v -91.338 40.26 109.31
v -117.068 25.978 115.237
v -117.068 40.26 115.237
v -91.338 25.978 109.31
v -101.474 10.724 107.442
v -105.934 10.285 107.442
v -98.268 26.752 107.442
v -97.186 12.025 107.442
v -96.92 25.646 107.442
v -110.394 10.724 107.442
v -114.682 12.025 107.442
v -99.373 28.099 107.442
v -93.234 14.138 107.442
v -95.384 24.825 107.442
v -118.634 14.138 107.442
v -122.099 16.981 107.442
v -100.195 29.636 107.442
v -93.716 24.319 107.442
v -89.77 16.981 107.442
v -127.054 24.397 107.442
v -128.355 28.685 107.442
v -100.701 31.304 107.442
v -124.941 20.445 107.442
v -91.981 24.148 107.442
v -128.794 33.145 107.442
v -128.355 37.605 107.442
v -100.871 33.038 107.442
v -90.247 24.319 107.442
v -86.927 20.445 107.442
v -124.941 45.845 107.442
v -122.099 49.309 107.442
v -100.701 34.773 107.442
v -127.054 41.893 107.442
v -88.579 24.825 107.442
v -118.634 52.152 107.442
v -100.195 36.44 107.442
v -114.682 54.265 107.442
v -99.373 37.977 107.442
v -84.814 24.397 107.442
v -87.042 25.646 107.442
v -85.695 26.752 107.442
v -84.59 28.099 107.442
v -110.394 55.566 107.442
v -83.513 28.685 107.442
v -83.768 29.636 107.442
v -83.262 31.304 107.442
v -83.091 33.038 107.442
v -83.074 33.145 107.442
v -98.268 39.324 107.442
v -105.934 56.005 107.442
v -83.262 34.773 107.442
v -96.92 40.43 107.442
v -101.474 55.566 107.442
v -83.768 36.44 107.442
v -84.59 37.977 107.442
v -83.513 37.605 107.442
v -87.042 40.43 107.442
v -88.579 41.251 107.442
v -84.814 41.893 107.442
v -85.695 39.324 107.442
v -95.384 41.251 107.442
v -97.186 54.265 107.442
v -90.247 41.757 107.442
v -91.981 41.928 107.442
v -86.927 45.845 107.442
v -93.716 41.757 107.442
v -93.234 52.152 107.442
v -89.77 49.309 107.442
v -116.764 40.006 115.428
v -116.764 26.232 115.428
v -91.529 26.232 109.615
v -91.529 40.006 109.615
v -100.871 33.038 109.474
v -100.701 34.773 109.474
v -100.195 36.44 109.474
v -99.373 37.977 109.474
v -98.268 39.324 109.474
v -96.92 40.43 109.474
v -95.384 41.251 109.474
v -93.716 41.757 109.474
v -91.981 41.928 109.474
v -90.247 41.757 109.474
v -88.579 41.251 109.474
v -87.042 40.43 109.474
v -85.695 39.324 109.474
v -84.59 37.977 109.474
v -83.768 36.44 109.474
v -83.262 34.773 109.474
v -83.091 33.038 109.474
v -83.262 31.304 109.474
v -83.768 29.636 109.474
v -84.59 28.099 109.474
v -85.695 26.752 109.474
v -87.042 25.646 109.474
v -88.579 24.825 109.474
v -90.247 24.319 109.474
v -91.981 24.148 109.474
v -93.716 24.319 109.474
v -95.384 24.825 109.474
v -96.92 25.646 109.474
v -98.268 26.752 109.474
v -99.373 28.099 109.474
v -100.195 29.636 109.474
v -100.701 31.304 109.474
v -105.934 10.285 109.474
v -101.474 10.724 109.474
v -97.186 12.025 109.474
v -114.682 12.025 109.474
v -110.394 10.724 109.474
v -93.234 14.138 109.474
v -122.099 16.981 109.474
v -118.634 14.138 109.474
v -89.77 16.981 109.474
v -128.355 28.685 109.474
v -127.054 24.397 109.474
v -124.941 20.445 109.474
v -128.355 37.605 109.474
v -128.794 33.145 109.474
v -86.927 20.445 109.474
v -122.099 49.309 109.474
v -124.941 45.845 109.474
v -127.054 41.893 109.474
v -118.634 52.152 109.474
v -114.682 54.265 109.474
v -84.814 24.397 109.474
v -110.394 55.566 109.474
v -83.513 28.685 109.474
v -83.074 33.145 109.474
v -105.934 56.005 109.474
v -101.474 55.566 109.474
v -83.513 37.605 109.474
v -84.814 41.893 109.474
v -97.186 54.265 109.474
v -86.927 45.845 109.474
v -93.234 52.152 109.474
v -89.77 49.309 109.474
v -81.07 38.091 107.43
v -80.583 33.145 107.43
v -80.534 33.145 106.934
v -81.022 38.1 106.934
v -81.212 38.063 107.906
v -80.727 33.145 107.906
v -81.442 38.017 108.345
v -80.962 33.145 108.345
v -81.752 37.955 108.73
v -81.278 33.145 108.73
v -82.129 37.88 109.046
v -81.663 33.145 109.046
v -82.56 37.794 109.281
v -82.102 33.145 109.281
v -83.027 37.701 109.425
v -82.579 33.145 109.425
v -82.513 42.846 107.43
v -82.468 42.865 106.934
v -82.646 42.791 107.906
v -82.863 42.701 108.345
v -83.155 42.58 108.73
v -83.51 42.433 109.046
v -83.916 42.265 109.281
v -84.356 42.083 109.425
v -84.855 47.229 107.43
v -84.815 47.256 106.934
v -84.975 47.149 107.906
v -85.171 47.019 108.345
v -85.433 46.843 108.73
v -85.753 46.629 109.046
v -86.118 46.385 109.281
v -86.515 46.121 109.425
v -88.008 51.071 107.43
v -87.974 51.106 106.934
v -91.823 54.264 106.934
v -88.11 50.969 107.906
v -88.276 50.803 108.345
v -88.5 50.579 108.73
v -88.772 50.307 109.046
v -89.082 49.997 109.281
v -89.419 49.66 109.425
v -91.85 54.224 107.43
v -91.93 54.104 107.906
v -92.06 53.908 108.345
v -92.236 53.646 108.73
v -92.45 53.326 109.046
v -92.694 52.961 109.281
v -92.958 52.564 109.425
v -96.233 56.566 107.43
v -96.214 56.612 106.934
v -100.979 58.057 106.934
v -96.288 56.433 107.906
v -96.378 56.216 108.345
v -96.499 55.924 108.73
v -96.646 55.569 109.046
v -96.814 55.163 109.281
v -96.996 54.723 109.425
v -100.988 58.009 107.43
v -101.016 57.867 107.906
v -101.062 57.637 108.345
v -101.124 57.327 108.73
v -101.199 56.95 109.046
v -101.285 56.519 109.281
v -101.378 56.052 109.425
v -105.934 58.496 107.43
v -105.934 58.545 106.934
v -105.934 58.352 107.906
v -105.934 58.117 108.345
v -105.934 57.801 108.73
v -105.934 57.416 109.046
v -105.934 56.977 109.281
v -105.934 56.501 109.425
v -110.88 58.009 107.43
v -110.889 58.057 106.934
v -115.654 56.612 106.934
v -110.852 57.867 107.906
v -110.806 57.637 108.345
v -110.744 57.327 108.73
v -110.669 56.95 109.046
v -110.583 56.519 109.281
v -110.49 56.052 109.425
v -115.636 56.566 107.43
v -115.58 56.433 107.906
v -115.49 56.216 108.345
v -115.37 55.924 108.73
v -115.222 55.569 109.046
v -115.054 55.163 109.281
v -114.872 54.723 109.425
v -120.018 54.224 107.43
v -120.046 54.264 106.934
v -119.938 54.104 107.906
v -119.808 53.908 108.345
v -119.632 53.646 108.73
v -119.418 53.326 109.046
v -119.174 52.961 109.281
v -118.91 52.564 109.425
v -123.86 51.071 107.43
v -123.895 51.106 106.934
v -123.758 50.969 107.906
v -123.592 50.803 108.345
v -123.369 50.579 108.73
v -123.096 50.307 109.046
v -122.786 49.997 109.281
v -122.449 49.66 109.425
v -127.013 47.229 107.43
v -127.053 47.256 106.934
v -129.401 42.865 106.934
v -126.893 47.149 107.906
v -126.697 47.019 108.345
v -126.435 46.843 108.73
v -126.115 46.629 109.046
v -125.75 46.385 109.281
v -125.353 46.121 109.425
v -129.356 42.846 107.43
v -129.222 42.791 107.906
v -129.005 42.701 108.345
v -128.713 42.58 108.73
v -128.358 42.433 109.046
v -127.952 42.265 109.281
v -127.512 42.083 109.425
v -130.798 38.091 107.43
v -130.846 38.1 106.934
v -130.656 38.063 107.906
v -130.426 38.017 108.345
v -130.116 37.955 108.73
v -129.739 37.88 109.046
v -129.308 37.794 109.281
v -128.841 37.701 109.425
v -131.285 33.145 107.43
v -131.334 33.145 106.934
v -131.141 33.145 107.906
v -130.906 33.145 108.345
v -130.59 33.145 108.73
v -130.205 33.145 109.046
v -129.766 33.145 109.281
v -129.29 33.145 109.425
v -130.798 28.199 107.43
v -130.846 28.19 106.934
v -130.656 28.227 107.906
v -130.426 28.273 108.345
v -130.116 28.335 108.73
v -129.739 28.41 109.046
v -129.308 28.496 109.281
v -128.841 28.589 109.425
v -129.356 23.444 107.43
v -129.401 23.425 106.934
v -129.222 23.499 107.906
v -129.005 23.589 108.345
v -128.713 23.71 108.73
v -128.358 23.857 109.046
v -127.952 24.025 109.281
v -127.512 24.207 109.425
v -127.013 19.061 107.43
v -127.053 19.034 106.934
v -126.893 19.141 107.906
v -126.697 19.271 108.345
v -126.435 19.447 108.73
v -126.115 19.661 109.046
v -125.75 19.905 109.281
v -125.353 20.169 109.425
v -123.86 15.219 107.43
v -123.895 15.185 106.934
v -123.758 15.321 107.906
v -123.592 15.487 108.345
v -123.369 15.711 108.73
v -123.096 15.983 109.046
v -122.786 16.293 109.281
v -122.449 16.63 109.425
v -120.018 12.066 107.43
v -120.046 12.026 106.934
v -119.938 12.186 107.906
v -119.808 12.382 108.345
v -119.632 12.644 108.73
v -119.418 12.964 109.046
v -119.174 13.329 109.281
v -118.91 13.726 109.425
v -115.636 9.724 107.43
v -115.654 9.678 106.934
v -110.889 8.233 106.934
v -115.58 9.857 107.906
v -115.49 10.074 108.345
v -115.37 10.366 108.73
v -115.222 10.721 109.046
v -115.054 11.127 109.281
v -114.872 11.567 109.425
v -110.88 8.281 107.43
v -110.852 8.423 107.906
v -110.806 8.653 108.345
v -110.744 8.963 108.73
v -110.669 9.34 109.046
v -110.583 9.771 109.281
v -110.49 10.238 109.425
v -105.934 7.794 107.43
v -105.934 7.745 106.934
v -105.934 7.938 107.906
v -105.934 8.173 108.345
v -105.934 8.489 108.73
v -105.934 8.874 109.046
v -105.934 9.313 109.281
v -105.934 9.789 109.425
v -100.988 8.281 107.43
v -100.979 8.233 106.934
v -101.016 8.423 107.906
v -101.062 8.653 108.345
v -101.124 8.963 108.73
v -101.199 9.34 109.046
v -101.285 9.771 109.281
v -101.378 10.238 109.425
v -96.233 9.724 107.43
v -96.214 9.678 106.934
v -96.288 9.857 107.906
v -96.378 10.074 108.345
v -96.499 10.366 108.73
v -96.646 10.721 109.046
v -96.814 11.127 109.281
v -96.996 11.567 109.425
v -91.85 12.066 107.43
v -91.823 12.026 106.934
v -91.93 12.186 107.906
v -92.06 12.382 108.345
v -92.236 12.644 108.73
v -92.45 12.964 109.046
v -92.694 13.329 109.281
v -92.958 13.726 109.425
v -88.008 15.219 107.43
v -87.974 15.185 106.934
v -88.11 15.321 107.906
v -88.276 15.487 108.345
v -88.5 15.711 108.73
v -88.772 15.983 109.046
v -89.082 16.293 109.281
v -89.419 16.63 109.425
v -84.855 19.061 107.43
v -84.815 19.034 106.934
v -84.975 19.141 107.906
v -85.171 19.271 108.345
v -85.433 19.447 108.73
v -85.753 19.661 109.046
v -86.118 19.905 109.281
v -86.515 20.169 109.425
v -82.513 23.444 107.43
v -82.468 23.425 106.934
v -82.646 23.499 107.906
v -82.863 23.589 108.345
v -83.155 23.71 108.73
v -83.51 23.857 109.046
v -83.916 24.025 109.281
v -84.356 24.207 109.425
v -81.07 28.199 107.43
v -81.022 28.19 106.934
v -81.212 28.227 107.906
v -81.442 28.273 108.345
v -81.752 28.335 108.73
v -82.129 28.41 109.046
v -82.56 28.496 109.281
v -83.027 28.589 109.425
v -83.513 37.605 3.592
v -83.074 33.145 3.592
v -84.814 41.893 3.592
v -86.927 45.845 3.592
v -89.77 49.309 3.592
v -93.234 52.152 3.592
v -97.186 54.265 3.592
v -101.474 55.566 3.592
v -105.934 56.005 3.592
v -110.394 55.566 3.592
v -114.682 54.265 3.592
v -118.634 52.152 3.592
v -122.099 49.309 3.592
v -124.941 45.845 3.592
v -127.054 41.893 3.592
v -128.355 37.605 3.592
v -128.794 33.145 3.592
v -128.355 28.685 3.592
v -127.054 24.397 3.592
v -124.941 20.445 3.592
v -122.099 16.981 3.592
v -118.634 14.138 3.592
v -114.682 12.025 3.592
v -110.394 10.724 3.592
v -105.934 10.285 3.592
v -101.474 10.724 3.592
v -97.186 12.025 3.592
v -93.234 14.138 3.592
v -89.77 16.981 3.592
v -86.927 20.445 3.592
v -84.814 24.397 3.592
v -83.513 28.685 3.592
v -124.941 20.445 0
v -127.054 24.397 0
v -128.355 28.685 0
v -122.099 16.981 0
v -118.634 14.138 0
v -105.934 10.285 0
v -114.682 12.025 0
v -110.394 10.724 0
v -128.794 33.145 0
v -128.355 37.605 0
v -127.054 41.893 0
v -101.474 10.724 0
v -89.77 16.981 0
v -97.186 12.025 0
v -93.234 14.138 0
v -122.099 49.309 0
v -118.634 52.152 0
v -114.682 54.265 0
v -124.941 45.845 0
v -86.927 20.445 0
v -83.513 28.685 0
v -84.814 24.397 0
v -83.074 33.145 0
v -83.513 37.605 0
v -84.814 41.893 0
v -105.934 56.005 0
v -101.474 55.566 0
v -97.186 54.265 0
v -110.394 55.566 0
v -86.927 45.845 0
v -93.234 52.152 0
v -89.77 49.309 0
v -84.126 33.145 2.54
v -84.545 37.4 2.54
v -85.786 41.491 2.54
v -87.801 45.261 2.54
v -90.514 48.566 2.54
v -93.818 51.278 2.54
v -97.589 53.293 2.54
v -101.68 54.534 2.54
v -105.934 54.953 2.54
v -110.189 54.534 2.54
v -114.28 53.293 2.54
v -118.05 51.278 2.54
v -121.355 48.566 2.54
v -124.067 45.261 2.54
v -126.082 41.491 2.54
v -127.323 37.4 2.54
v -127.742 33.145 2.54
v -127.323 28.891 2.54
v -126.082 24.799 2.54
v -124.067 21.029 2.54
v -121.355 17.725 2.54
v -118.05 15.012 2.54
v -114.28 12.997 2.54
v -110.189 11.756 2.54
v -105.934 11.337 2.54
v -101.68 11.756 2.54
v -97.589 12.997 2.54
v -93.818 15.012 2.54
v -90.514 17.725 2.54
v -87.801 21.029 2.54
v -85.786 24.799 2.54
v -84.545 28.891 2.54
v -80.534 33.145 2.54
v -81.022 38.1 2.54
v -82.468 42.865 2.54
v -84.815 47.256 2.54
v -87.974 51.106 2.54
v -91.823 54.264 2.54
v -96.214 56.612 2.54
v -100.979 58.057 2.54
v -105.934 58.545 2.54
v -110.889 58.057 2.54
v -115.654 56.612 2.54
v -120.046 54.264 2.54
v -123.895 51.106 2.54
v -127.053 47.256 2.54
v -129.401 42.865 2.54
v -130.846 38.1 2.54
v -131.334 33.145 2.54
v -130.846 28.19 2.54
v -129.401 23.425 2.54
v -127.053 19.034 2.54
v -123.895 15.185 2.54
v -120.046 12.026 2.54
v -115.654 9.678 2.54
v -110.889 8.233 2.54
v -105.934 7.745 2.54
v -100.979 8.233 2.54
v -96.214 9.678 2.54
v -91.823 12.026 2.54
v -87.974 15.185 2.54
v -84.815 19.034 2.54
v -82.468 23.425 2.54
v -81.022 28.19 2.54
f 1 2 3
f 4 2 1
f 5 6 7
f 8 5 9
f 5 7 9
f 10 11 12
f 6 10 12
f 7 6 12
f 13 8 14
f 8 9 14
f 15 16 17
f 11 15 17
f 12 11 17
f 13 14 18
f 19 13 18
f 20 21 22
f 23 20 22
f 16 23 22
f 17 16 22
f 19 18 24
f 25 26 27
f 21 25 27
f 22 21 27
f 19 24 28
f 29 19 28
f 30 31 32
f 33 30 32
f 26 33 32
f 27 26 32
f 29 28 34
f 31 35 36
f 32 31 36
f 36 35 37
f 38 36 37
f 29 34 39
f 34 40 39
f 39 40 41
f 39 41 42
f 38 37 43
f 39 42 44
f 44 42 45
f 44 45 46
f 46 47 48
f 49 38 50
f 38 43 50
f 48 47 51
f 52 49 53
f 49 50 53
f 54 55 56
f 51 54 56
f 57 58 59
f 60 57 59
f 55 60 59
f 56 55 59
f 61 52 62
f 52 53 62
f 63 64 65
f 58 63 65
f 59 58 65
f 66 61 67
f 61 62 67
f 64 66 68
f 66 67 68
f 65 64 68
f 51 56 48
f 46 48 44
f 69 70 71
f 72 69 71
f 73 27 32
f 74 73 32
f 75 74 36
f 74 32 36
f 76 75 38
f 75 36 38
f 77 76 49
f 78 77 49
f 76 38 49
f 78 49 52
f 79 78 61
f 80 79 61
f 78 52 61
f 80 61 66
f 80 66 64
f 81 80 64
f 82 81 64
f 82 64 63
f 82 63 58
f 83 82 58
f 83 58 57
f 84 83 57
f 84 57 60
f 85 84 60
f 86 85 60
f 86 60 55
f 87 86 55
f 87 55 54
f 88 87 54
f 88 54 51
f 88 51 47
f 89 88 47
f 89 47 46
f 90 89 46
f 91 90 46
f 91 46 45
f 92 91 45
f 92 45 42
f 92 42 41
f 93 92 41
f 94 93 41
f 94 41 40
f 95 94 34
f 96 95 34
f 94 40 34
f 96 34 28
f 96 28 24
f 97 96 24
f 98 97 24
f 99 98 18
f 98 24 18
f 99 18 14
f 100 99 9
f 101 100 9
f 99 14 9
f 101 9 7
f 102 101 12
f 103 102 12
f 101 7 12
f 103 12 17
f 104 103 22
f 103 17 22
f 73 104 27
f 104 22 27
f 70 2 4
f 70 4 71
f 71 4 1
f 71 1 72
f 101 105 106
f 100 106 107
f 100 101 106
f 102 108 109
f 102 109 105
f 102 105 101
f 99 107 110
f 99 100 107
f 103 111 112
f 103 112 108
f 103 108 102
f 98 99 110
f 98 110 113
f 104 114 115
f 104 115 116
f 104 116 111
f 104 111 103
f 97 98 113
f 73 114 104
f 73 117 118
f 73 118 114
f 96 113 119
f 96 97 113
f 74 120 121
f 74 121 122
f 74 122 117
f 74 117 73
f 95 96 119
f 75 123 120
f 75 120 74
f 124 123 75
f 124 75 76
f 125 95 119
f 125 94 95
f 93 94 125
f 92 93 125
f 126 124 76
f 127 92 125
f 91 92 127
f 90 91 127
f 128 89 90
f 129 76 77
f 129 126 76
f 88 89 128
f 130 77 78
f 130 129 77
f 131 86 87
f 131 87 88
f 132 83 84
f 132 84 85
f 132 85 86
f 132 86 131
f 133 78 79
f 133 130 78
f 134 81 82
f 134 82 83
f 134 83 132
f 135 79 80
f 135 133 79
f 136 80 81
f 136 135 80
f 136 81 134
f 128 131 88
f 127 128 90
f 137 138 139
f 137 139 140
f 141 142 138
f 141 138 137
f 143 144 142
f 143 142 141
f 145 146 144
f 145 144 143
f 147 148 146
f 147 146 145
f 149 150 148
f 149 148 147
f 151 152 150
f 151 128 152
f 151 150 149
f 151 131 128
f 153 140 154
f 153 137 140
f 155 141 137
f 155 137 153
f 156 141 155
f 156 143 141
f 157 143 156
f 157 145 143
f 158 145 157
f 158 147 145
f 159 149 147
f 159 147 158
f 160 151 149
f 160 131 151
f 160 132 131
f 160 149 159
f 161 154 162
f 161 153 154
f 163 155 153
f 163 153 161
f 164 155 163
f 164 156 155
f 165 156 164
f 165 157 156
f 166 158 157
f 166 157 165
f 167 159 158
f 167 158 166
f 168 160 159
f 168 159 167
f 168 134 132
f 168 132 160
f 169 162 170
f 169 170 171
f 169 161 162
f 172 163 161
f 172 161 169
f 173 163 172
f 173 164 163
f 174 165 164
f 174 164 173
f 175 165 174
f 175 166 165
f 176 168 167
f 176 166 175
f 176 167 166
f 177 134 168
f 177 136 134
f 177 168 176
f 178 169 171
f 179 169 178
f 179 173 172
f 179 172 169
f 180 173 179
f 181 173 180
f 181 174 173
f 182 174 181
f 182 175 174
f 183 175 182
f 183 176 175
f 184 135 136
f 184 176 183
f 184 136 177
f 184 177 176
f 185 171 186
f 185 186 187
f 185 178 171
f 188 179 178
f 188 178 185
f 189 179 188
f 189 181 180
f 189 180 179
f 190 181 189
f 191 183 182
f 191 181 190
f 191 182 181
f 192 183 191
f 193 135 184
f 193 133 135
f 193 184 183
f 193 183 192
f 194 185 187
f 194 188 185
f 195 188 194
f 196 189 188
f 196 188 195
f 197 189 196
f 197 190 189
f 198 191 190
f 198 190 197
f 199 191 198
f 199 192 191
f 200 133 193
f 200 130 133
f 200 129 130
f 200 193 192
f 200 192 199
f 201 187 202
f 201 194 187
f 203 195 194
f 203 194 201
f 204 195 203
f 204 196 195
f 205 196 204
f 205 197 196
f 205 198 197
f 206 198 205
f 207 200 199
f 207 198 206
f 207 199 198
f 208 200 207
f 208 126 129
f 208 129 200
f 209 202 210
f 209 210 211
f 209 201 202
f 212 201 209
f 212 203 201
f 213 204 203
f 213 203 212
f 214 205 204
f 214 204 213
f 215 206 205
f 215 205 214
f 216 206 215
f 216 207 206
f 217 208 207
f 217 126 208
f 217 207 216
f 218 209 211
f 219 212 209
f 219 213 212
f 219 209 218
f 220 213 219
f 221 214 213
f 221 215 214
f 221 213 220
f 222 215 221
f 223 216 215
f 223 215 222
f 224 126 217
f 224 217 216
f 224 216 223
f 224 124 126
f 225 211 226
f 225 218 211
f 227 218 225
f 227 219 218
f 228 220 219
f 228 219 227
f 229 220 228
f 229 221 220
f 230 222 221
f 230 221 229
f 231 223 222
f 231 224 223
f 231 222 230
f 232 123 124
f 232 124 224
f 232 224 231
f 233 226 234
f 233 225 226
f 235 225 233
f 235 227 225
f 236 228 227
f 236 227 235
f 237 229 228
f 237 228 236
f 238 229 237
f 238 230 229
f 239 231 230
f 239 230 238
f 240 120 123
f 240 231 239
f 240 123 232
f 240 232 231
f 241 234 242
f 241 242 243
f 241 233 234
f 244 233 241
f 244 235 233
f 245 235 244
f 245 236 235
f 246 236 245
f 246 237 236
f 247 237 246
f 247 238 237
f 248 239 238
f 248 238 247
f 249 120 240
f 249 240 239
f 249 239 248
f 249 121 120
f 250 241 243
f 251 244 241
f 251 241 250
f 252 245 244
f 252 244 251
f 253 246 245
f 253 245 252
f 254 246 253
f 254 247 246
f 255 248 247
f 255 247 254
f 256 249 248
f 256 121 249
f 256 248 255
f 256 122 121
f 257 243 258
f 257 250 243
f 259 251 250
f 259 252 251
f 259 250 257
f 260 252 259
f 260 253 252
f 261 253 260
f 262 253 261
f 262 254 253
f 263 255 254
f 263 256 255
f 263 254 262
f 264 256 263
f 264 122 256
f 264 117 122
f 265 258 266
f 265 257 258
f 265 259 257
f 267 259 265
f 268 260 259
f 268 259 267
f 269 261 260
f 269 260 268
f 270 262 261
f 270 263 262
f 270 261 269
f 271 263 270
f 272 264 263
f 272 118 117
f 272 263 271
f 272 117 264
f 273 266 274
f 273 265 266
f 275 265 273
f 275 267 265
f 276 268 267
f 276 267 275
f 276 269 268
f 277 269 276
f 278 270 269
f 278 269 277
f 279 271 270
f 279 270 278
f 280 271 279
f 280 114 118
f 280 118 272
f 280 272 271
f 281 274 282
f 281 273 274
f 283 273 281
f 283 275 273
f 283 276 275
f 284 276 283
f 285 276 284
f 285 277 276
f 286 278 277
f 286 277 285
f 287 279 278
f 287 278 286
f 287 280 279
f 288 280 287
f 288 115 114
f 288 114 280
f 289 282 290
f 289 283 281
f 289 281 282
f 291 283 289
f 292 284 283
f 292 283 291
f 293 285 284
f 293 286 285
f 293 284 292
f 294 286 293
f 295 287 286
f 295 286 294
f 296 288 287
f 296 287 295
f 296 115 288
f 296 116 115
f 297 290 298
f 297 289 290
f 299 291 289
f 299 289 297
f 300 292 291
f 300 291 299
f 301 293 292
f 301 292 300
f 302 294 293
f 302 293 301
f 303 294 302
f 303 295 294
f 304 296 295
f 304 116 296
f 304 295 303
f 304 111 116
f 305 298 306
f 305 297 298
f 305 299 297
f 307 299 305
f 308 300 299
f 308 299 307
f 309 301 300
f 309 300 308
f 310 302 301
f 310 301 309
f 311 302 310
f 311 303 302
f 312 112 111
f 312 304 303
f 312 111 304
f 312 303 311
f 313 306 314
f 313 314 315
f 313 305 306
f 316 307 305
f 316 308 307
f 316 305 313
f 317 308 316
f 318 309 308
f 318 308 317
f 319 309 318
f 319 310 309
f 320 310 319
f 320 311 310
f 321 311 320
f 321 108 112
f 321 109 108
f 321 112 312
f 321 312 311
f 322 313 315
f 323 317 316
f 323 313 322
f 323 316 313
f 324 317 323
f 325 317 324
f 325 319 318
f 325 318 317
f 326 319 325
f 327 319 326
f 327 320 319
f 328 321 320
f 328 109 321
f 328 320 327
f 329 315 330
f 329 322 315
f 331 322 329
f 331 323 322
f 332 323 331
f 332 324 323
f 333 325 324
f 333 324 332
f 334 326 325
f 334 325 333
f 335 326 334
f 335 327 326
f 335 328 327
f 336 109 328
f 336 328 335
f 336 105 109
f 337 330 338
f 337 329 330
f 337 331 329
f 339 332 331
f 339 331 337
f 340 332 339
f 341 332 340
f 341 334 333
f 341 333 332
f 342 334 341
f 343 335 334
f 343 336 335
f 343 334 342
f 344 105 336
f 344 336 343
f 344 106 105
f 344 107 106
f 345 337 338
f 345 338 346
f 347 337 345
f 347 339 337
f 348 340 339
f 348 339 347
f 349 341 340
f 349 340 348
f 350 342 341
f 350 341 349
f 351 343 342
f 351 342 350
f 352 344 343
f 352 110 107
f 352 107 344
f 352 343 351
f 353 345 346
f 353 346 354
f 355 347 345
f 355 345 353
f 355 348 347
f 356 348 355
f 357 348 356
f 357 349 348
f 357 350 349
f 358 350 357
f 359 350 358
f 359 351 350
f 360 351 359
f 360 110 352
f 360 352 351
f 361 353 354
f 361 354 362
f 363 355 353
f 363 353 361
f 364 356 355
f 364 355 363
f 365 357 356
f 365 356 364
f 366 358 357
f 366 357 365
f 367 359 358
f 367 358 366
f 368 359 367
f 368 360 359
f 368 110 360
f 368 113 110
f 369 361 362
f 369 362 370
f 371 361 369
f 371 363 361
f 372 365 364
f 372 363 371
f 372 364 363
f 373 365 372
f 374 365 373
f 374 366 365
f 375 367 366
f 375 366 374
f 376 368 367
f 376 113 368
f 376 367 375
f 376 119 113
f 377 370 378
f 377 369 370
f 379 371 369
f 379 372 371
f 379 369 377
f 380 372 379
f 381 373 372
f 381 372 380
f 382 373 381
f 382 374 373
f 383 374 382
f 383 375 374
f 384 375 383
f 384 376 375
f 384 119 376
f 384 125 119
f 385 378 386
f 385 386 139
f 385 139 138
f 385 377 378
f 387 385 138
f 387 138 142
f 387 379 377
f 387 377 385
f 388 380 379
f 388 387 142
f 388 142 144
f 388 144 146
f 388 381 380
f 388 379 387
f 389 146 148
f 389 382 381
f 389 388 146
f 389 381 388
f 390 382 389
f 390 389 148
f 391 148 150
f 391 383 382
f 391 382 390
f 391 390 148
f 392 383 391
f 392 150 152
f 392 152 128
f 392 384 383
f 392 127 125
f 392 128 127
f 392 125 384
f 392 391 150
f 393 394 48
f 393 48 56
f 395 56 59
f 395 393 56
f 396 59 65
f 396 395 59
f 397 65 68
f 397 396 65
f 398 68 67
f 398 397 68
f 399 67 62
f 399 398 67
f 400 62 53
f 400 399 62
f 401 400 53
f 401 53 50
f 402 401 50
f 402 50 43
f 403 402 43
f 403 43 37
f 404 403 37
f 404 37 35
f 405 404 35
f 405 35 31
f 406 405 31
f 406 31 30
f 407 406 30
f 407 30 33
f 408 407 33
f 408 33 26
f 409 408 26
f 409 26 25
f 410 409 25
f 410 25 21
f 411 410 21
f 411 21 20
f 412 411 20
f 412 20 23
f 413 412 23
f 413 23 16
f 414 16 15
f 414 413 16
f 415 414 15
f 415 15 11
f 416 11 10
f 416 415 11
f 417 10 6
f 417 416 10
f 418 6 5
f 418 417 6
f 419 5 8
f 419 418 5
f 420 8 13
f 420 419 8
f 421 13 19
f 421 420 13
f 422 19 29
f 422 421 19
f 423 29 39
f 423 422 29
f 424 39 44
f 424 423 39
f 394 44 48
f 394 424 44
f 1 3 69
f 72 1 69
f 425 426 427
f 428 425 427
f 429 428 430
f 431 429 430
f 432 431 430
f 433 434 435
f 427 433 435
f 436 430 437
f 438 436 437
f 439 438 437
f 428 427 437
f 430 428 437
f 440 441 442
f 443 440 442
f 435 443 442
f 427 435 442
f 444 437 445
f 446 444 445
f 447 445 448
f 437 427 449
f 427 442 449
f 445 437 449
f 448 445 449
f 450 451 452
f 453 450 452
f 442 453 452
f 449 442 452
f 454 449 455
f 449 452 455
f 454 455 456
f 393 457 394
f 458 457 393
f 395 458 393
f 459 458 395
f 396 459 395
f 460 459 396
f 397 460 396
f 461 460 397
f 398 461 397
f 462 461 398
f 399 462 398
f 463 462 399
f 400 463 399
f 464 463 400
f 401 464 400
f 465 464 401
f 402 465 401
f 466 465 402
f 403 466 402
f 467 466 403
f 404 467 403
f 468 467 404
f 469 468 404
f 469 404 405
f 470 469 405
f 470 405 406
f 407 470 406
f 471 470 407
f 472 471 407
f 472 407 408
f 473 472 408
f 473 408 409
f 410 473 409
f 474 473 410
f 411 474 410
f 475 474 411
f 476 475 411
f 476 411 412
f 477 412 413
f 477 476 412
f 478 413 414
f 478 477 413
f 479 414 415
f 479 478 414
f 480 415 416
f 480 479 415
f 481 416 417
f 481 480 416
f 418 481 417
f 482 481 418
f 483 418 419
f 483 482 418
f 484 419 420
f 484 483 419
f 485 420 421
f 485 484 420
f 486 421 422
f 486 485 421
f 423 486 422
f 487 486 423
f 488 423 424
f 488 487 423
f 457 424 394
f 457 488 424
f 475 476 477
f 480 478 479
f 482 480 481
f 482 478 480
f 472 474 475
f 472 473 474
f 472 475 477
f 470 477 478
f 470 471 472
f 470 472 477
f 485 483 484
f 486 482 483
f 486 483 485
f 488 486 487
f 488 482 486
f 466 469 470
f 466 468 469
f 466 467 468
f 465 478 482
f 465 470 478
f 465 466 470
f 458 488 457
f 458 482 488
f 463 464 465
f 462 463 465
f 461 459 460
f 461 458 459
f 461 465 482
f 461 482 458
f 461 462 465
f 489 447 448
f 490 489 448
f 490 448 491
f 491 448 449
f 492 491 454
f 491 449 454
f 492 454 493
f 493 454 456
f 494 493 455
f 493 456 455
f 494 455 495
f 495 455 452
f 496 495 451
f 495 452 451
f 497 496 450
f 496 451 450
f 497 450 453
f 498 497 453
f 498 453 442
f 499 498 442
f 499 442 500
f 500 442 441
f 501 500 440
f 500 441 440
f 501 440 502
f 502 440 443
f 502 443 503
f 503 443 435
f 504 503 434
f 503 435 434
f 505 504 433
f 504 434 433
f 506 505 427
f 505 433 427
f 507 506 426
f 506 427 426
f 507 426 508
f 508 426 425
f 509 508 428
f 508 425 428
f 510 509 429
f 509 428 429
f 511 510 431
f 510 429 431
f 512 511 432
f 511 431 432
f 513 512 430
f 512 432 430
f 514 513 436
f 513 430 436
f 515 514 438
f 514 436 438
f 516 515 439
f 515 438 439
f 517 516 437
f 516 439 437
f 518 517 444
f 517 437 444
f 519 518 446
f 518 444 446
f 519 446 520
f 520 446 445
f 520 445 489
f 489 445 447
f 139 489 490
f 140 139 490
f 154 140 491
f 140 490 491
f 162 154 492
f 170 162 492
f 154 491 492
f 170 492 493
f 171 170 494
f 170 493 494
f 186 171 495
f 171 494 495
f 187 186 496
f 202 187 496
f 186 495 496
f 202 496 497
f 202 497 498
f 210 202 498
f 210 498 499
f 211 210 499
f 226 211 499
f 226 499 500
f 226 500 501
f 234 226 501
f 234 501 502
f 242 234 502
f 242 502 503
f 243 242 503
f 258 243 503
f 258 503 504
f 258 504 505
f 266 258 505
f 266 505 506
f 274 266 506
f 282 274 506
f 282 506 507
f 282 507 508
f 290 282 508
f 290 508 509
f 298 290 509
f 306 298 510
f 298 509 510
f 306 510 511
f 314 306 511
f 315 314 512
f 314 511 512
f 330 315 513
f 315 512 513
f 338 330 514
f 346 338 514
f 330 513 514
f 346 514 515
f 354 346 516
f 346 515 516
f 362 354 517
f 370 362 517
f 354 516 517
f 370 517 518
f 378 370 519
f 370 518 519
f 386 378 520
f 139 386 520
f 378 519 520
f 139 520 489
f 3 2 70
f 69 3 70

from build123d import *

# Parameters (mm, degrees)
F0_R         = 25.4
F1_DEPTH     = 107.442
F2_SIZE      = 2.54
F3_T         = -2.54
F4_R         = 25.4
F5_DEPTH     = 2.032
F6_R         = 2.54
F10_W        = 28.9435833693
F10_H        = 16.822071746
F11_DEPTH    = 0.254
F13_D        = 17.78
F13_DEPTH    = 12.7
F13_TIP      = 5.3416509032
F14_T1_DEPTH = 24.6605614933
F14_T3_DEPTH = 36.7820731166
F14_T5_DEPTH = 36.7820731166


# Not quite as in the source:
# - a fillet or chamfer that OpenCascade refuses, or shapes differently, is made with other operations: its cross-section is extruded or revolved along the edge and cut away or added


with BuildPart() as f1:
    # F0 (on Top) → F1 (new body)
    with BuildSketch(Plane.XY):
        with Locations((-105.93406111, 33.1450141966)):
            Circle(F0_R)
    extrude(amount=F1_DEPTH)

    # F2
    f2_edges = [f1.edges().sort_by_distance(p)[0] for p in [
        (-131.334061, 33.145014, 0),
    ]]
    chamfer(f2_edges, length=F2_SIZE)

    # F3
    f3_openings = [f1.faces().sort_by_distance(p)[0] for p in [
        (-105.934061, 33.145014, 107.442),
    ]]
    offset(amount=F3_T, openings=f3_openings)

    # F4 (on face) → F5 (join)
    with BuildSketch(Plane.XY.offset(107.442)):
        with Locations((-105.93406111, 33.1450141966)):
            Circle(F4_R)
    extrude(amount=F5_DEPTH)

    # F6
    f6_edges = [f1.edges().sort_by_distance(p)[0] for p in [
        (-131.334061, 33.145014, 109.474),
    ]]
    fillet(f6_edges, radius=F6_R)

    # F13
    with Locations(Plane.XY.offset(109.474)):
        with Locations((-91.9814705849, 33.0381914973)):
            Hole(F13_D / 2, depth=F13_DEPTH)
            with Locations((0, 0, -(F13_DEPTH + F13_TIP / 2))):  # 118° drill point
                Cone(0, F13_D / 2, F13_TIP, mode=Mode.SUBTRACT)


with BuildPart() as f11:
    # F10 (on offset) → F11 (new body)
    with BuildSketch(Plane(origin=(19.3098159265, 0, 83.8195546276), x_dir=(0.974475589, 0, -0.2244934888), z_dir=(-0.2244934888, 0, -0.974475589))):
        with Locations((-126.7482116818, -33.1188505515)):
            Rectangle(F10_W, F10_H)
    extrude(amount=-F11_DEPTH)

    # F14: chamfer of 1.524 on 4 edges, made by hand

    # F14_s2 → F14_t1 (cut)
    with BuildSketch(Plane.XZ.offset(-45.4491312982)):
        Polygon((-118.5907367584, 114.2849418733), (-116.7635078839, 115.4279145939), (-118.2486086815, 115.7700426708), align=None)
        Polygon((-90.3859213079, 107.7872958644), (-91.5288940286, 109.6145247389), (-90.043793231, 109.272396662), align=None)
    extrude(amount=F14_T1_DEPTH, mode=Mode.SUBTRACT)

    # F14_s4 → F14_t3 (cut)
    with BuildSketch(Plane(origin=(-141.4346544107, 0, 32.5828161988), x_dir=(0, 1, 0), z_dir=(0.974475589, 0, -0.2244934888))):
        Polygon((41.5298864245, 84.7450378078), (40.0058864245, 86.2690378078), (41.5298864245, 86.2690378078), align=None)
    extrude(amount=F14_T3_DEPTH, mode=Mode.SUBTRACT)

    # F14_s6 → F14_t5 (cut)
    with BuildSketch(Plane(origin=(-105.5914220471, 0, 24.3254802797), x_dir=(0, 1, 0), z_dir=(-0.974475589, 0, 0.2244934888))):
        Polygon((24.7078146785, -84.7450378078), (26.2318146785, -86.2690378078), (24.7078146785, -86.2690378078), align=None)
    extrude(amount=F14_T5_DEPTH, mode=Mode.SUBTRACT)


solid = Compound([f1.part, f11.part])
